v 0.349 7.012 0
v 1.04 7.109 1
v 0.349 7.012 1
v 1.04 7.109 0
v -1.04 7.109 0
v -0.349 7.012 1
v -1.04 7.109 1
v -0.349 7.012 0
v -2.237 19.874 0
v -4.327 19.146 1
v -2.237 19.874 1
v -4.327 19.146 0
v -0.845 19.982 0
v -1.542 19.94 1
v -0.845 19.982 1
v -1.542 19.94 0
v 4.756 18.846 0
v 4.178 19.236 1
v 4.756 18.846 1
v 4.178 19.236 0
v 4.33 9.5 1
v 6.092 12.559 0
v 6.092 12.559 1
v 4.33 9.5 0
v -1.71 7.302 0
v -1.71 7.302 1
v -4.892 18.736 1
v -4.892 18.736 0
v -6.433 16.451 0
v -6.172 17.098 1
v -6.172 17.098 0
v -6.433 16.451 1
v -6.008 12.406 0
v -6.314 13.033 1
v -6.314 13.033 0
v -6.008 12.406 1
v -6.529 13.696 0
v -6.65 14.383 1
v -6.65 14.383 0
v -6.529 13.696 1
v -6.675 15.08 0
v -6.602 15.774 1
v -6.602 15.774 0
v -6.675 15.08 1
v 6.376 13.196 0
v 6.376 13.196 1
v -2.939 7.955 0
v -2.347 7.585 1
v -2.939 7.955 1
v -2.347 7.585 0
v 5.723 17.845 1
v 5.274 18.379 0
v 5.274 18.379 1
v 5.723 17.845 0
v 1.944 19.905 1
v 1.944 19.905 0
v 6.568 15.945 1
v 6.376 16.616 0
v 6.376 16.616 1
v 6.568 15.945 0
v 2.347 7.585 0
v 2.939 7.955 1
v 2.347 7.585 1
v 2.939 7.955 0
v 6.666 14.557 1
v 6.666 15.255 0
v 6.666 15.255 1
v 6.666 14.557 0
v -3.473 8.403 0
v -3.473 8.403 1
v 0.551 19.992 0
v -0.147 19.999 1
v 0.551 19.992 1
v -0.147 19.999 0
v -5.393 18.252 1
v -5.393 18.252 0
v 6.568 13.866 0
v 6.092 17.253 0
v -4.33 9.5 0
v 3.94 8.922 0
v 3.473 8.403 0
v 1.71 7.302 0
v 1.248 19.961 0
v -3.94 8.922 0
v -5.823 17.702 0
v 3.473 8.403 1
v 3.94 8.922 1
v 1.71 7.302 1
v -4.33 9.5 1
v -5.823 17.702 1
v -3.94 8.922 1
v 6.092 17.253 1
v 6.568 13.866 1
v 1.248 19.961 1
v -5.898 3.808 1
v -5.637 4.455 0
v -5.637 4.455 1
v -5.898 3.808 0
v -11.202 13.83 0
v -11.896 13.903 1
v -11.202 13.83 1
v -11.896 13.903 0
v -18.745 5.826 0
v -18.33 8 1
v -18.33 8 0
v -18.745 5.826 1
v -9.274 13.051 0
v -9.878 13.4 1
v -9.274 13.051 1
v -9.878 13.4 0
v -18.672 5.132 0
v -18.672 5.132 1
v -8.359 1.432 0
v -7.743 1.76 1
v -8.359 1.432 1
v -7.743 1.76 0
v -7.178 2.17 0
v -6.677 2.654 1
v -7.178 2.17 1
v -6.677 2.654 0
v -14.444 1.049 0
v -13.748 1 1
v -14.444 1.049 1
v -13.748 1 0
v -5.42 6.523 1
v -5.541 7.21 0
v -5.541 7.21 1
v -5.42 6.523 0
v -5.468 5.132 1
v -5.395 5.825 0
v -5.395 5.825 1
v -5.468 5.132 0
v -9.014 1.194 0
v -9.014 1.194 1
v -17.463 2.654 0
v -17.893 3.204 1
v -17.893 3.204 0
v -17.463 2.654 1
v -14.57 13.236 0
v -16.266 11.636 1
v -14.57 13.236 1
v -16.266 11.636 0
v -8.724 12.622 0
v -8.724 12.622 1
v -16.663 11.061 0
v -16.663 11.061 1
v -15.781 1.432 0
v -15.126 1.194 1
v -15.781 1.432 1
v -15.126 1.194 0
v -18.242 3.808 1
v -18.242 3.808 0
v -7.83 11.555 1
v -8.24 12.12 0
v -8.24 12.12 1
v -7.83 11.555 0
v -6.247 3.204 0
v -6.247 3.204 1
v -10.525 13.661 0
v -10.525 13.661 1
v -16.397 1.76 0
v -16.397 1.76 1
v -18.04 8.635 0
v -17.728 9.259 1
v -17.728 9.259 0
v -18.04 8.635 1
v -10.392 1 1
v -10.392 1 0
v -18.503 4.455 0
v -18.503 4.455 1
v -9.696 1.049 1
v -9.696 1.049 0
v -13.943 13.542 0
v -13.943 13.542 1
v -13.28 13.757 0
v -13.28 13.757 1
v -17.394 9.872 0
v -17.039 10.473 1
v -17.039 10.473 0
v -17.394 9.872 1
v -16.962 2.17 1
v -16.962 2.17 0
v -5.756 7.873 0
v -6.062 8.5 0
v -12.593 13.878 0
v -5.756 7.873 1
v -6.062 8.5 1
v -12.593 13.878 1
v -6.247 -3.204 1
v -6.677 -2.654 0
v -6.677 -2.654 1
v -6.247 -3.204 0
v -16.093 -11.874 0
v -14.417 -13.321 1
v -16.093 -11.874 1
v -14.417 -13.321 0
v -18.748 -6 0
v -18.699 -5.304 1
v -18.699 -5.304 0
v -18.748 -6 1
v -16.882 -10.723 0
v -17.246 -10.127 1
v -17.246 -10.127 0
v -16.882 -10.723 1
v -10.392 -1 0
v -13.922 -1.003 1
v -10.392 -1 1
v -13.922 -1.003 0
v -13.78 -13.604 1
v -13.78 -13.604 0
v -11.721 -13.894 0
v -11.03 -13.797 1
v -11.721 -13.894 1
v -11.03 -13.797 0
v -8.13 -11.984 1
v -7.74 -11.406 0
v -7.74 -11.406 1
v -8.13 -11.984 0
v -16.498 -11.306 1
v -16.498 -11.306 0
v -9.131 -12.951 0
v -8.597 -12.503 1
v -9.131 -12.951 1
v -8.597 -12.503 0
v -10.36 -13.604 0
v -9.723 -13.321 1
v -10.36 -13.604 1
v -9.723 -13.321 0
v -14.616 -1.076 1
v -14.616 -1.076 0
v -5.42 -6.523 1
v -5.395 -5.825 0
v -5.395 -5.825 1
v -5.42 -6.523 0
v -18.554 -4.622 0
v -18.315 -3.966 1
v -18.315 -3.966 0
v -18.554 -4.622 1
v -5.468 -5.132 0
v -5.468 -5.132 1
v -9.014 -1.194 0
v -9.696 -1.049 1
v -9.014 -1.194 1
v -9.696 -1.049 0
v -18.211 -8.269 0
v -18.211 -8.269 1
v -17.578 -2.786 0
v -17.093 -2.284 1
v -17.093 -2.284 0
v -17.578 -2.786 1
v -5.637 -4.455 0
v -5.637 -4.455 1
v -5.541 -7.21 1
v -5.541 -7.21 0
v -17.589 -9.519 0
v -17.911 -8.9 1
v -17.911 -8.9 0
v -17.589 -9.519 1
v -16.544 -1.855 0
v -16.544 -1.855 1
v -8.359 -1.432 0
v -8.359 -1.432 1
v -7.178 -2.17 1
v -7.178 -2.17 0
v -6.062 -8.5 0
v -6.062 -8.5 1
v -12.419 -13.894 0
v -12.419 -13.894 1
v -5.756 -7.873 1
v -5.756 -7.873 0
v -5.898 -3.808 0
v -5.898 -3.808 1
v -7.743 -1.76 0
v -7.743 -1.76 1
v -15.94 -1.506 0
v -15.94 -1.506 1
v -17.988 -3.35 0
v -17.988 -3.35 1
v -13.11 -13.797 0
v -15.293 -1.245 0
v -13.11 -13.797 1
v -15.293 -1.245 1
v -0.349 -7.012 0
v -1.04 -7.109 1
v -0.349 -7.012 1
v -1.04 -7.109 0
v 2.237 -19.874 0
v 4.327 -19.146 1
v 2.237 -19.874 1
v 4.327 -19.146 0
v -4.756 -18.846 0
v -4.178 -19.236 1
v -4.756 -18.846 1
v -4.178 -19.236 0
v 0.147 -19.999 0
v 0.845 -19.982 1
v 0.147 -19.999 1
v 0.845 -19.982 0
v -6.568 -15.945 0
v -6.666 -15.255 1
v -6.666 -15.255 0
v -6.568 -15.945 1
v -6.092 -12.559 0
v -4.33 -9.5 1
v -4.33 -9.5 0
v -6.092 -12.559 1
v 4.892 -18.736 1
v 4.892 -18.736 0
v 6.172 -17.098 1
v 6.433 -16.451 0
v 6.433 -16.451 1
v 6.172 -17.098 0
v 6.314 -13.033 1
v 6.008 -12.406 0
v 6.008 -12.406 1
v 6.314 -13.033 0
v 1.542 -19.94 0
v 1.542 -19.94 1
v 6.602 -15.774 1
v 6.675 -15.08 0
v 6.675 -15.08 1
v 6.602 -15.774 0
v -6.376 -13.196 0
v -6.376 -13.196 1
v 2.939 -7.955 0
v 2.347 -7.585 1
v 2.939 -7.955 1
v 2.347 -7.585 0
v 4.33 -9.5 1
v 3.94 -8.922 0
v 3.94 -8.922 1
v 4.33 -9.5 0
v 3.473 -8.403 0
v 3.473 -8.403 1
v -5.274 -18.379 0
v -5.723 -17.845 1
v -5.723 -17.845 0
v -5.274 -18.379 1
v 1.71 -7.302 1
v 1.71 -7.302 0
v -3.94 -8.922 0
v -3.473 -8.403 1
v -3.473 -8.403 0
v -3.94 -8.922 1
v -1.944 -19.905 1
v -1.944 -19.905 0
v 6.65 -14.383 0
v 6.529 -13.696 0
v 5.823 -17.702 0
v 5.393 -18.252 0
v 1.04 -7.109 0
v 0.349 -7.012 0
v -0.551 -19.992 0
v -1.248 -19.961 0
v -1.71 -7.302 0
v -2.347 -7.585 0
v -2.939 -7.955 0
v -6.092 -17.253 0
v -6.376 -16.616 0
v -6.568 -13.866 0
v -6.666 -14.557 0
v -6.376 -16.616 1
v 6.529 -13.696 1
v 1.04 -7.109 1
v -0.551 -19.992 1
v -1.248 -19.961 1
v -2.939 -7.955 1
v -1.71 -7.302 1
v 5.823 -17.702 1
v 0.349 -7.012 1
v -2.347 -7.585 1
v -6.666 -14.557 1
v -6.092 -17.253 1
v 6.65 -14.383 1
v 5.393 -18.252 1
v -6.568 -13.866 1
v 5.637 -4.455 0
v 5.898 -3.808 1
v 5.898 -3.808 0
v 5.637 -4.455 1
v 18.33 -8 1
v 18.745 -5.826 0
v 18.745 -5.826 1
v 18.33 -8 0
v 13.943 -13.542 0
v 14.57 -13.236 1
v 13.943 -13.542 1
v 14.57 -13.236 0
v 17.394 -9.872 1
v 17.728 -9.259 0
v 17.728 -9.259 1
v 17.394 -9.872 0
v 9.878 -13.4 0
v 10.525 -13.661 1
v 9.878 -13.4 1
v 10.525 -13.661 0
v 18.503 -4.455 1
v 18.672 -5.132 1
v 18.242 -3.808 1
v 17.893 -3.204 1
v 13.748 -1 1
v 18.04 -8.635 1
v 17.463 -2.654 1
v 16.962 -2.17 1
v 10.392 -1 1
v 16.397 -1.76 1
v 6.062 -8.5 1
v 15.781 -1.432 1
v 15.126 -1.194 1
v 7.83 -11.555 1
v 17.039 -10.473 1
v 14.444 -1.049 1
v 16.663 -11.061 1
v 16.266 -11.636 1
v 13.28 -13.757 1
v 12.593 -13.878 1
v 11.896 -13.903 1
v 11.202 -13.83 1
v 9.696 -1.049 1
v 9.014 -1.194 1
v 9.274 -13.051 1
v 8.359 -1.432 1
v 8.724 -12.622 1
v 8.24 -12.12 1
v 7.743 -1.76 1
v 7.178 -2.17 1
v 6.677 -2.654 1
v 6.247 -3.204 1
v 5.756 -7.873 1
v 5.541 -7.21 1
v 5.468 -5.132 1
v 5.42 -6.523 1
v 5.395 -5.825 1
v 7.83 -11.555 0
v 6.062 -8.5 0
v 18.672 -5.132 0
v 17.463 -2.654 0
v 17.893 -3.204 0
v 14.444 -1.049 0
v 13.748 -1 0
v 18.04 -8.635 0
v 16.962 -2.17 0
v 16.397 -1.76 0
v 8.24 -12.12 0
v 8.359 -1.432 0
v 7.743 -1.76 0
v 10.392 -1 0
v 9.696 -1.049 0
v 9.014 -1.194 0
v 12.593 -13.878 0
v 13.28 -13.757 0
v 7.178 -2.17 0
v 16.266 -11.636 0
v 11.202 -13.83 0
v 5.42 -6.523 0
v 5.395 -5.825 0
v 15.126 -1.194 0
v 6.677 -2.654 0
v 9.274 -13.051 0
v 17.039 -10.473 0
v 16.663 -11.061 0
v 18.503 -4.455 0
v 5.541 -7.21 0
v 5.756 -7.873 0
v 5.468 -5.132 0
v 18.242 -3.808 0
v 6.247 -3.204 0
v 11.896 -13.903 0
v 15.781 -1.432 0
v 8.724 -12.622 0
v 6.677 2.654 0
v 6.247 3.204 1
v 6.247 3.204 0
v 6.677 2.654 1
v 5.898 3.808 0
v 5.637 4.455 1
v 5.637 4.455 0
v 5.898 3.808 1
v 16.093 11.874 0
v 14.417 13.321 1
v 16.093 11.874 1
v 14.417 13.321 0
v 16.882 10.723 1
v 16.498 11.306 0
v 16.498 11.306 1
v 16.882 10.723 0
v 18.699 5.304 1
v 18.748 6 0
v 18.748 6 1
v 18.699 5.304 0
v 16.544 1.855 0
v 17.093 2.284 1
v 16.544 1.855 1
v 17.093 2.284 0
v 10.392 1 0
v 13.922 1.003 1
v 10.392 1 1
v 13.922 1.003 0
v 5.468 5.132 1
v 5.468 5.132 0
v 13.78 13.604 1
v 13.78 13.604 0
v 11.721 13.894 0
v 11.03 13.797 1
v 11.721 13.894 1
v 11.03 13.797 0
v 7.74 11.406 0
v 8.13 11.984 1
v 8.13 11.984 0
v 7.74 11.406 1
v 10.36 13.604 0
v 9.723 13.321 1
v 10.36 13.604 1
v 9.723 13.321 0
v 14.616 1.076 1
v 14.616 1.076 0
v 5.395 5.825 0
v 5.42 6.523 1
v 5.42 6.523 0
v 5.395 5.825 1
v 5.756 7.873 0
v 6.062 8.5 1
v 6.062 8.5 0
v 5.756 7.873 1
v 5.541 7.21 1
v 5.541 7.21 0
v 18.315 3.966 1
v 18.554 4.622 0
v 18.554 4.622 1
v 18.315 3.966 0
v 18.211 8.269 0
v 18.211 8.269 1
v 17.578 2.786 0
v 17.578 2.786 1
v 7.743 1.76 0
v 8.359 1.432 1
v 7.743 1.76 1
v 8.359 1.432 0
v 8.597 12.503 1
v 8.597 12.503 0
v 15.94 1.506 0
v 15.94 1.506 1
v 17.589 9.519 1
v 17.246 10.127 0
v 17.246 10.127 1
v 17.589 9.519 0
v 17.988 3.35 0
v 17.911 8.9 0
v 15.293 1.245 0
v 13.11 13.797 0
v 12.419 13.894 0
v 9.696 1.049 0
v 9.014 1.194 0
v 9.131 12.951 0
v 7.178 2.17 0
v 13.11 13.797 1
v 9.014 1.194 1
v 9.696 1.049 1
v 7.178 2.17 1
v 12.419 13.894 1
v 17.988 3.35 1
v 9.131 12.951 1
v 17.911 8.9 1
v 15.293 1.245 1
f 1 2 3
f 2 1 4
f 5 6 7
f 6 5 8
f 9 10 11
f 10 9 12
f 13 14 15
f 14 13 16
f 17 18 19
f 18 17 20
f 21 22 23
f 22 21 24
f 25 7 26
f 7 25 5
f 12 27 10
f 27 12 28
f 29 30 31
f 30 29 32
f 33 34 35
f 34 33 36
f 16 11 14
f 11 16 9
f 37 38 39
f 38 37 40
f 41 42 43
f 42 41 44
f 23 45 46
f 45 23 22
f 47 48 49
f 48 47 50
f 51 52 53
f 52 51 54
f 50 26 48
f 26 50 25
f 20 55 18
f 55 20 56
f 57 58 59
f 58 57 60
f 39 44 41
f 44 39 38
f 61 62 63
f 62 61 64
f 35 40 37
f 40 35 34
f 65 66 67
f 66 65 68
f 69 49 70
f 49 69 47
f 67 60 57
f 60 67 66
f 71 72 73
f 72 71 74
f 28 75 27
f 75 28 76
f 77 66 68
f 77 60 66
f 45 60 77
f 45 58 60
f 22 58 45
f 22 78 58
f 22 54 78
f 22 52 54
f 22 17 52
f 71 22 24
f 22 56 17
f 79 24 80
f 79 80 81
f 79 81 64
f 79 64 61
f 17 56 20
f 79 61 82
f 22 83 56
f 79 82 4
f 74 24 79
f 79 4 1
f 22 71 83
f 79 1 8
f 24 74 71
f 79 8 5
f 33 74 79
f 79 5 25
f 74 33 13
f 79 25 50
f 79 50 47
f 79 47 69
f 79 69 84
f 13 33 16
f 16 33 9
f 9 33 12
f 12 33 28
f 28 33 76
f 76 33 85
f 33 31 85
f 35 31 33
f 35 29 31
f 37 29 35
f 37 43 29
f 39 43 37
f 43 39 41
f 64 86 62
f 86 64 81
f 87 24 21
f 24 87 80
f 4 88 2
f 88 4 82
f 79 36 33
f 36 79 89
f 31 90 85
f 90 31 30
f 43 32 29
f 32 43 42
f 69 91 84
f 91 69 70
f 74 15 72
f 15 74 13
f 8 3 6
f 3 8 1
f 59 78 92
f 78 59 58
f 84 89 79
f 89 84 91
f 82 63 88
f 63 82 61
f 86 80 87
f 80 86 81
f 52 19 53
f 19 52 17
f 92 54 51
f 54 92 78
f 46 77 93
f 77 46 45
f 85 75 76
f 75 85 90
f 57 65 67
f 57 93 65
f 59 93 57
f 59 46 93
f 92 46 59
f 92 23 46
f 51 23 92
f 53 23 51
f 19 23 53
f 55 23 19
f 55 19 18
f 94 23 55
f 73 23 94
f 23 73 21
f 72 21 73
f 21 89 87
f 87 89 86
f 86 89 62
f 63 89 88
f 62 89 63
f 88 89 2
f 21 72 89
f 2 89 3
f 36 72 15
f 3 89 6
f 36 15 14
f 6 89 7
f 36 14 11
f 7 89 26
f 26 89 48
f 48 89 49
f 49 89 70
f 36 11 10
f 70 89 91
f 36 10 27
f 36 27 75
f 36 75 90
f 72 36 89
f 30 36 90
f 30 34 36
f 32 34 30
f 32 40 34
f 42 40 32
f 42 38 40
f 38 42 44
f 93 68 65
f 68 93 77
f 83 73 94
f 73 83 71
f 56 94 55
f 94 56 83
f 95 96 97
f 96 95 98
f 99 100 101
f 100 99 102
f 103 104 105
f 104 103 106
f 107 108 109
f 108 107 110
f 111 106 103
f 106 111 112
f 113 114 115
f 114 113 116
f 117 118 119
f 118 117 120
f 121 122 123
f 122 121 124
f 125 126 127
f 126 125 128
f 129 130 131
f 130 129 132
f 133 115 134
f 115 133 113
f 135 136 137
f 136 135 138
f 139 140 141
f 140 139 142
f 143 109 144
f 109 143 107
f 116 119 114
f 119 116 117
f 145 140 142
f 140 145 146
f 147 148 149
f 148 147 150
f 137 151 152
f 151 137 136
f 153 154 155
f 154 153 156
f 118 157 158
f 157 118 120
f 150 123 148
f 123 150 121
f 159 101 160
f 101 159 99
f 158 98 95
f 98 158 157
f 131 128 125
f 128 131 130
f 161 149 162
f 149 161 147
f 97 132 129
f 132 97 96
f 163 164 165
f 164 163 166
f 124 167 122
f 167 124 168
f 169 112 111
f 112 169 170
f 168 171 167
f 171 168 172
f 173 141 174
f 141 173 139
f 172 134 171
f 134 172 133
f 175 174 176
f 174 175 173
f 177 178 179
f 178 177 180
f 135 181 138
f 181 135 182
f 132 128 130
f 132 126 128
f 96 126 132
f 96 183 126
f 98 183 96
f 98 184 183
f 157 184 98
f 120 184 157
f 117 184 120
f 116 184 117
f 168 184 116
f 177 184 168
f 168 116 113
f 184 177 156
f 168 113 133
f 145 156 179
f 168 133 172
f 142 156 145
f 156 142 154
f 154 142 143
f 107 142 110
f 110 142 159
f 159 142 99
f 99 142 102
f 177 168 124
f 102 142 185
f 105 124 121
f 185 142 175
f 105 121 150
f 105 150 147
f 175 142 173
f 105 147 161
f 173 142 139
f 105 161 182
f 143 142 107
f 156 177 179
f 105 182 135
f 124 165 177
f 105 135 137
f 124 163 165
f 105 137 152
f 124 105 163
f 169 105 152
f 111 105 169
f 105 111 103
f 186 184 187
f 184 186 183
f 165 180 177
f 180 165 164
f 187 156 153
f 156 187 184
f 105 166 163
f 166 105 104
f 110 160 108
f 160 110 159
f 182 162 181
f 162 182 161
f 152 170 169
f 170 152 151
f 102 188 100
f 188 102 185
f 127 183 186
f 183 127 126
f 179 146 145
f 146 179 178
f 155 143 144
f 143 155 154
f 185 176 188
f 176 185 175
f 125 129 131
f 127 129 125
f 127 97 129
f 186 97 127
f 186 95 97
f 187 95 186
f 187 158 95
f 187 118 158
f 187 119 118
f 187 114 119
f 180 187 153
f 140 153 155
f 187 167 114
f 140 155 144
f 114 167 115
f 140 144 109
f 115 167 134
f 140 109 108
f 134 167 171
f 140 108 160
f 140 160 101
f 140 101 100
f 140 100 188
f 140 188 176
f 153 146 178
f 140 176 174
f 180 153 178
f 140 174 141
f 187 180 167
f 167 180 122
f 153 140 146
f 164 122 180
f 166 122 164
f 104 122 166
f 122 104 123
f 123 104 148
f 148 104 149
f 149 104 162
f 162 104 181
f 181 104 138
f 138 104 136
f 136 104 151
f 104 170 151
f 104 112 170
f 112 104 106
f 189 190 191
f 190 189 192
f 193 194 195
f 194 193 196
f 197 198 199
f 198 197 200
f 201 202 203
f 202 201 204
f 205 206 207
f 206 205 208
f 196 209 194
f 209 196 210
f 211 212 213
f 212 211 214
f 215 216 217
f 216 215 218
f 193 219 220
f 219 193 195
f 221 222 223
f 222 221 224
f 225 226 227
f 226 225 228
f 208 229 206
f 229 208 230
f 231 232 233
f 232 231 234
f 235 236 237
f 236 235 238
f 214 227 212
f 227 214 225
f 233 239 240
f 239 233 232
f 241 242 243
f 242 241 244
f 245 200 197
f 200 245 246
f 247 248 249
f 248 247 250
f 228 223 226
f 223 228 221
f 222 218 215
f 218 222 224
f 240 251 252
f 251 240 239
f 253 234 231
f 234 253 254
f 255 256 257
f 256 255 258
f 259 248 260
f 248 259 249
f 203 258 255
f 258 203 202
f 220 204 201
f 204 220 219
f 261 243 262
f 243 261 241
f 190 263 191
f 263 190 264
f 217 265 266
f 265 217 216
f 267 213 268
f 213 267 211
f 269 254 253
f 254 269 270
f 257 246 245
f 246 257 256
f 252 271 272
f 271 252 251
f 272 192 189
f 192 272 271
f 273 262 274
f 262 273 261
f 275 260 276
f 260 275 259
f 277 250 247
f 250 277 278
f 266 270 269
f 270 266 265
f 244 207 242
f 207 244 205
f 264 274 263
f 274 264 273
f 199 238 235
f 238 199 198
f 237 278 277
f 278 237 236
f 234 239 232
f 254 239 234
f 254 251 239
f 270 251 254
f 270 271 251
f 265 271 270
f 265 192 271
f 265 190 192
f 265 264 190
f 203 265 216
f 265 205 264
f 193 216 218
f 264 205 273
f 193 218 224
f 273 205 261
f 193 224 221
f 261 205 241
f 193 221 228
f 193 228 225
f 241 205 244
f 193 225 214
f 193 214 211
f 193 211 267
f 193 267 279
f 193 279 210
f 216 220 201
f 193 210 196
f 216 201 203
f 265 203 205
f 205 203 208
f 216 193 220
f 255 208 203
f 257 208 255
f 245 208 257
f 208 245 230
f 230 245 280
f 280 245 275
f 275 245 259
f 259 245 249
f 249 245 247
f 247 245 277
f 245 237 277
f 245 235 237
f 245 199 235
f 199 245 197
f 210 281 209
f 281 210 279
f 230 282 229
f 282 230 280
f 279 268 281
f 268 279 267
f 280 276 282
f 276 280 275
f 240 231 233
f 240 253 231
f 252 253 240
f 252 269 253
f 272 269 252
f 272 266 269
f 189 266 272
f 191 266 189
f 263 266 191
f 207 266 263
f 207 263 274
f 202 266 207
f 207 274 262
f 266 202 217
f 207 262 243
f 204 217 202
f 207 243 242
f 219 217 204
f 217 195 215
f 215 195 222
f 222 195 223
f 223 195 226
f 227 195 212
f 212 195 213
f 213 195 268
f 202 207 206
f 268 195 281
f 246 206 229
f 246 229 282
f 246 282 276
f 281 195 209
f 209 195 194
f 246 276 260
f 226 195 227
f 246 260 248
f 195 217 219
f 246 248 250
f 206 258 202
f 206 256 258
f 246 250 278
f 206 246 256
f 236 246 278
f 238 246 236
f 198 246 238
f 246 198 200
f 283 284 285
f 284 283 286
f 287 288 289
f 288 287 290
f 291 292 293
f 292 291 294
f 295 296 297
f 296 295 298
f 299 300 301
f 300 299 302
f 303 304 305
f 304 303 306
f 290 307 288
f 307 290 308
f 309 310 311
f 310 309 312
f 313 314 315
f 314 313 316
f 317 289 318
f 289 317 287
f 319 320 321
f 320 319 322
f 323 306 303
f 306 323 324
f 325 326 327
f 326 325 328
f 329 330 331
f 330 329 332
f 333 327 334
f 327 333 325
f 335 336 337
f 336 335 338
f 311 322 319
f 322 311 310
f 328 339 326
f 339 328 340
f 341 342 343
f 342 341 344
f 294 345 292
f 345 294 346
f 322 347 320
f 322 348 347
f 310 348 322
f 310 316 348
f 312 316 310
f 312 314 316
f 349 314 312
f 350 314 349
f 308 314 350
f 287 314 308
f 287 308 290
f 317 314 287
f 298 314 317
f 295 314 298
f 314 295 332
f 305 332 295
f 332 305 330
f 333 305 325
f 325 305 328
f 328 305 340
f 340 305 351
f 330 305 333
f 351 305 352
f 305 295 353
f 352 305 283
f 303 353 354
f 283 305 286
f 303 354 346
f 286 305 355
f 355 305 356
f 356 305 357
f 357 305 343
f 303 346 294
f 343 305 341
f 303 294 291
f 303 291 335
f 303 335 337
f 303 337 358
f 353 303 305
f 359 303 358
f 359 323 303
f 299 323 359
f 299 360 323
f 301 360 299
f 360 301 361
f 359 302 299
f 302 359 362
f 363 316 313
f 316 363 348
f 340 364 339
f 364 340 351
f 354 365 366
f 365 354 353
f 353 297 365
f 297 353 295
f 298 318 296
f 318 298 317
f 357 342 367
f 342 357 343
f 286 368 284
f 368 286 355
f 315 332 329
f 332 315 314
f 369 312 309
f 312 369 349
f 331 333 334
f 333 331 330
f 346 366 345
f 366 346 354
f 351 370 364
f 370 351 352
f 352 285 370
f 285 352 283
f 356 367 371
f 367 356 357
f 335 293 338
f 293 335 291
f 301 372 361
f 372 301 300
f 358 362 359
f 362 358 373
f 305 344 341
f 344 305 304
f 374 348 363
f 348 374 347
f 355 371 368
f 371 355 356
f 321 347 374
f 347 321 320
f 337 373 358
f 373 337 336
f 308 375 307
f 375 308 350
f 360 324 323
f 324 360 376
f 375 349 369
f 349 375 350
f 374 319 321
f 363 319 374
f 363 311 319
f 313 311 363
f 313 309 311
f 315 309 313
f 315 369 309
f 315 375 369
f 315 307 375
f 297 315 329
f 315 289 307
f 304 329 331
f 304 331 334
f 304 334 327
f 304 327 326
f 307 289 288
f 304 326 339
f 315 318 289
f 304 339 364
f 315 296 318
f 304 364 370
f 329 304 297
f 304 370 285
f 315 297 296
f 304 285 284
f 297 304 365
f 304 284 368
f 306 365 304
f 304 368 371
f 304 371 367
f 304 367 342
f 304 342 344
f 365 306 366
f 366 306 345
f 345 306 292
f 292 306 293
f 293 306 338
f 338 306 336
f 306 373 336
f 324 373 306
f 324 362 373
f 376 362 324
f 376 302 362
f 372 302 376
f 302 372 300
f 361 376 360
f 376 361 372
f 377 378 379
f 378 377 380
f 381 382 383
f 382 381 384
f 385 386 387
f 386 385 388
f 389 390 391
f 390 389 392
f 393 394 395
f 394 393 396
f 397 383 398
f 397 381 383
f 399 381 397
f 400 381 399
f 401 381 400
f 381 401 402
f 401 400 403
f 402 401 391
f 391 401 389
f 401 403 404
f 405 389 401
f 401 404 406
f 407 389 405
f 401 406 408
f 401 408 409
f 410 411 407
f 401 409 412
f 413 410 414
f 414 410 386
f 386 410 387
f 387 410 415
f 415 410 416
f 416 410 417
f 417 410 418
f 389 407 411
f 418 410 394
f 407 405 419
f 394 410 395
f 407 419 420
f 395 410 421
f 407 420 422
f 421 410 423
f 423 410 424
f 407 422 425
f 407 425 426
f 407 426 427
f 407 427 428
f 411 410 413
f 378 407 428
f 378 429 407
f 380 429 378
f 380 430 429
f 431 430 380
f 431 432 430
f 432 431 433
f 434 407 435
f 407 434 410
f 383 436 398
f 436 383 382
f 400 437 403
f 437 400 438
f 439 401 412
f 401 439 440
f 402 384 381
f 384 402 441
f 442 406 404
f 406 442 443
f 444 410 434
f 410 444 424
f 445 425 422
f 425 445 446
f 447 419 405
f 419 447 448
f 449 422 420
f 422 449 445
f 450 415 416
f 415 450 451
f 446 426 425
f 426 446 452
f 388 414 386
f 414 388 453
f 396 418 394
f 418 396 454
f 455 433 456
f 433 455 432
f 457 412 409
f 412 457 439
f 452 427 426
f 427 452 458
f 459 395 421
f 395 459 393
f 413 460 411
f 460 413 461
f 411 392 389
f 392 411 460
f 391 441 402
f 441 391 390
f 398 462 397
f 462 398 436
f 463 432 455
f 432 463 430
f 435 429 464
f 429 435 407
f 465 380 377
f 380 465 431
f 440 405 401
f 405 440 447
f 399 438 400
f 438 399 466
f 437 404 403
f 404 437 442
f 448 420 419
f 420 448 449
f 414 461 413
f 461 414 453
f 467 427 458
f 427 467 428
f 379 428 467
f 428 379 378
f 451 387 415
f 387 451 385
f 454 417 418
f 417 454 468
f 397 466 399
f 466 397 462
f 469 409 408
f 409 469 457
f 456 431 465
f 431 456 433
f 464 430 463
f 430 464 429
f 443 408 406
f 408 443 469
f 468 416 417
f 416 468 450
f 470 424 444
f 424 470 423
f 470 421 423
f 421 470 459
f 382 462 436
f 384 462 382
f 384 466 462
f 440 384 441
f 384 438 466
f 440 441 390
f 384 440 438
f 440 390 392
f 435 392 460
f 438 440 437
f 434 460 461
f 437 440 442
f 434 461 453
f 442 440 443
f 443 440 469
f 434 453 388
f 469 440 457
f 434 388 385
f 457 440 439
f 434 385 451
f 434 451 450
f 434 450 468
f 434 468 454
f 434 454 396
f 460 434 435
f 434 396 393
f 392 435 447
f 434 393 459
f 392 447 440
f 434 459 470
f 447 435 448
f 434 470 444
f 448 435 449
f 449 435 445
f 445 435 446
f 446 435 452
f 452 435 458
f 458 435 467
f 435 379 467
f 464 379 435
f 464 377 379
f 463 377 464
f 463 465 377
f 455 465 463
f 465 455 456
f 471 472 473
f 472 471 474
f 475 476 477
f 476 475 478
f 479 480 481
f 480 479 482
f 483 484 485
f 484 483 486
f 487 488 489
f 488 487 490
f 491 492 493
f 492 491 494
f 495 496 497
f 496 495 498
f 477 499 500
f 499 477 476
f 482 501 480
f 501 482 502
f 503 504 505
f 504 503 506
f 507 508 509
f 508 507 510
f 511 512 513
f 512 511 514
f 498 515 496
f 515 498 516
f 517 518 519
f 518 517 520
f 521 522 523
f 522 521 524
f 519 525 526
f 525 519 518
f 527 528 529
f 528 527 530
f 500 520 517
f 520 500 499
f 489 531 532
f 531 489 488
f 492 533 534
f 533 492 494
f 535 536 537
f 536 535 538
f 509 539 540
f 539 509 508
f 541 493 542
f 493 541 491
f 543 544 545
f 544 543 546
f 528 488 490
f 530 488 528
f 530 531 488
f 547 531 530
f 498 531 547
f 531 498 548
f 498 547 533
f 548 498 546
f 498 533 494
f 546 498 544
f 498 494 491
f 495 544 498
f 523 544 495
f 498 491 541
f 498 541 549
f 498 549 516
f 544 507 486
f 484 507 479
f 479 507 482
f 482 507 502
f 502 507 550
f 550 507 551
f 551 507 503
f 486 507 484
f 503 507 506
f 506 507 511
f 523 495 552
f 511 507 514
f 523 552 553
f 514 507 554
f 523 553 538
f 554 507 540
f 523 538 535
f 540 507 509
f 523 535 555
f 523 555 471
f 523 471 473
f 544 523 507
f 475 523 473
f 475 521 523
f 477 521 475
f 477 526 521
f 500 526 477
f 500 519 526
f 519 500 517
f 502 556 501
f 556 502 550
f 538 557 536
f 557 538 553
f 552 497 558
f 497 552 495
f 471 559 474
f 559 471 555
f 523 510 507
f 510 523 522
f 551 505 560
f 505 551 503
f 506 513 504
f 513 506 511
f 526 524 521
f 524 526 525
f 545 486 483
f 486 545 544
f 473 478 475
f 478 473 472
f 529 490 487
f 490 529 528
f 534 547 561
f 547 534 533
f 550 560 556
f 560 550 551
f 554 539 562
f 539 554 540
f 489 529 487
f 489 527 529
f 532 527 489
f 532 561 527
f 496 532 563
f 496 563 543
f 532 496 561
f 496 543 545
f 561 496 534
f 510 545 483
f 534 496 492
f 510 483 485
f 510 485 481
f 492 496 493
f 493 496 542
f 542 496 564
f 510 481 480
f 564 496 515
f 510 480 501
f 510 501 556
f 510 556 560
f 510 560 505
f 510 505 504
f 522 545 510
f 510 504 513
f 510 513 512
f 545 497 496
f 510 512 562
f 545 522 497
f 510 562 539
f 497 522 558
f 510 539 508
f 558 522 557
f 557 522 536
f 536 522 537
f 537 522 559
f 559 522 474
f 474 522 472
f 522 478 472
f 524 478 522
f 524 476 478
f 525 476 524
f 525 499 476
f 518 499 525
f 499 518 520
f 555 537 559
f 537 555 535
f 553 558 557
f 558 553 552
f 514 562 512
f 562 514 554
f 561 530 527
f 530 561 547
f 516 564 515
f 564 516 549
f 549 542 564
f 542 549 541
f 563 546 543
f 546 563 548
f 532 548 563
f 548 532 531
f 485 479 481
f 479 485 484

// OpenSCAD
module rounded_60deg_segment( r1 = 20, r2 = 5, r3 = 5, cd = 5+2, res = 2 )
{
	// r1 = outside radius
	// r2 = inside radius
	// r3 = radius of corner curve
	// cd = center distance, distance of closest point to circle center
	// res = resolution of ourside circle

	sd = (cd-r2)/2;
	
	// calculate corner center
	// ref: https://mathworld.wolfram.com/Circle-LineIntersection.html
	x1 = 0 + sin(-60) * (sd + r3);
	y1 = 0 + cos(-60) * (sd + r3);
	x2 = sin(30) * r1 + sin(-60) * (sd + r3);
	y2 = cos(30) * r1 + cos(-60) * (sd + r3);
	r = r1 - r3;
	dx = x2 - x1;
	dy = y2 - y1;
	dr = sqrt( dx*dx + dy*dy );
	D = x1*y2 - x2*y1;

	x = (+D * dy + dx * sqrt( r*r * dr*dr - D*D )) / (dr*dr);
	y = (-D * dx + dy * sqrt( r*r * dr*dr - D*D )) / (dr*dr);

	// calculate start angle of outside circle segment
	sa = atan2( x, y );
	
	// calculate corner resolution
	cres = res * r1/r3;

	// calculate inside resolution
	ires = res * r1/r2;

	// inside curve
	pg1 = [ for( a=[120:ires:240] ) [r2*sin(a),cd+r2+r2*cos(a)] ];

	// corner 1
	pg2 = [ for( a=[240:cres:330] ) [-x+r3*sin(a),y+r3*cos(a)] ];

	// outside
	pg3 = [ for( a=[-sa:res:+sa] ) [r1*sin(a),r1*cos(a)] ];

	// corner 2
	pg4 = [ for( a=[ 30:cres:120] ) [+x+r3*sin(a),y+r3*cos(a)] ];

	pg = concat( pg1, pg2, pg3, pg4 );

	polygon( pg );
}


for( a=[0:60:359] ) {
	rotate( [0,0,a] ) 
		linear_extrude( height = 1 ) rounded_60deg_segment();
}

//rounded_60deg_segment();
